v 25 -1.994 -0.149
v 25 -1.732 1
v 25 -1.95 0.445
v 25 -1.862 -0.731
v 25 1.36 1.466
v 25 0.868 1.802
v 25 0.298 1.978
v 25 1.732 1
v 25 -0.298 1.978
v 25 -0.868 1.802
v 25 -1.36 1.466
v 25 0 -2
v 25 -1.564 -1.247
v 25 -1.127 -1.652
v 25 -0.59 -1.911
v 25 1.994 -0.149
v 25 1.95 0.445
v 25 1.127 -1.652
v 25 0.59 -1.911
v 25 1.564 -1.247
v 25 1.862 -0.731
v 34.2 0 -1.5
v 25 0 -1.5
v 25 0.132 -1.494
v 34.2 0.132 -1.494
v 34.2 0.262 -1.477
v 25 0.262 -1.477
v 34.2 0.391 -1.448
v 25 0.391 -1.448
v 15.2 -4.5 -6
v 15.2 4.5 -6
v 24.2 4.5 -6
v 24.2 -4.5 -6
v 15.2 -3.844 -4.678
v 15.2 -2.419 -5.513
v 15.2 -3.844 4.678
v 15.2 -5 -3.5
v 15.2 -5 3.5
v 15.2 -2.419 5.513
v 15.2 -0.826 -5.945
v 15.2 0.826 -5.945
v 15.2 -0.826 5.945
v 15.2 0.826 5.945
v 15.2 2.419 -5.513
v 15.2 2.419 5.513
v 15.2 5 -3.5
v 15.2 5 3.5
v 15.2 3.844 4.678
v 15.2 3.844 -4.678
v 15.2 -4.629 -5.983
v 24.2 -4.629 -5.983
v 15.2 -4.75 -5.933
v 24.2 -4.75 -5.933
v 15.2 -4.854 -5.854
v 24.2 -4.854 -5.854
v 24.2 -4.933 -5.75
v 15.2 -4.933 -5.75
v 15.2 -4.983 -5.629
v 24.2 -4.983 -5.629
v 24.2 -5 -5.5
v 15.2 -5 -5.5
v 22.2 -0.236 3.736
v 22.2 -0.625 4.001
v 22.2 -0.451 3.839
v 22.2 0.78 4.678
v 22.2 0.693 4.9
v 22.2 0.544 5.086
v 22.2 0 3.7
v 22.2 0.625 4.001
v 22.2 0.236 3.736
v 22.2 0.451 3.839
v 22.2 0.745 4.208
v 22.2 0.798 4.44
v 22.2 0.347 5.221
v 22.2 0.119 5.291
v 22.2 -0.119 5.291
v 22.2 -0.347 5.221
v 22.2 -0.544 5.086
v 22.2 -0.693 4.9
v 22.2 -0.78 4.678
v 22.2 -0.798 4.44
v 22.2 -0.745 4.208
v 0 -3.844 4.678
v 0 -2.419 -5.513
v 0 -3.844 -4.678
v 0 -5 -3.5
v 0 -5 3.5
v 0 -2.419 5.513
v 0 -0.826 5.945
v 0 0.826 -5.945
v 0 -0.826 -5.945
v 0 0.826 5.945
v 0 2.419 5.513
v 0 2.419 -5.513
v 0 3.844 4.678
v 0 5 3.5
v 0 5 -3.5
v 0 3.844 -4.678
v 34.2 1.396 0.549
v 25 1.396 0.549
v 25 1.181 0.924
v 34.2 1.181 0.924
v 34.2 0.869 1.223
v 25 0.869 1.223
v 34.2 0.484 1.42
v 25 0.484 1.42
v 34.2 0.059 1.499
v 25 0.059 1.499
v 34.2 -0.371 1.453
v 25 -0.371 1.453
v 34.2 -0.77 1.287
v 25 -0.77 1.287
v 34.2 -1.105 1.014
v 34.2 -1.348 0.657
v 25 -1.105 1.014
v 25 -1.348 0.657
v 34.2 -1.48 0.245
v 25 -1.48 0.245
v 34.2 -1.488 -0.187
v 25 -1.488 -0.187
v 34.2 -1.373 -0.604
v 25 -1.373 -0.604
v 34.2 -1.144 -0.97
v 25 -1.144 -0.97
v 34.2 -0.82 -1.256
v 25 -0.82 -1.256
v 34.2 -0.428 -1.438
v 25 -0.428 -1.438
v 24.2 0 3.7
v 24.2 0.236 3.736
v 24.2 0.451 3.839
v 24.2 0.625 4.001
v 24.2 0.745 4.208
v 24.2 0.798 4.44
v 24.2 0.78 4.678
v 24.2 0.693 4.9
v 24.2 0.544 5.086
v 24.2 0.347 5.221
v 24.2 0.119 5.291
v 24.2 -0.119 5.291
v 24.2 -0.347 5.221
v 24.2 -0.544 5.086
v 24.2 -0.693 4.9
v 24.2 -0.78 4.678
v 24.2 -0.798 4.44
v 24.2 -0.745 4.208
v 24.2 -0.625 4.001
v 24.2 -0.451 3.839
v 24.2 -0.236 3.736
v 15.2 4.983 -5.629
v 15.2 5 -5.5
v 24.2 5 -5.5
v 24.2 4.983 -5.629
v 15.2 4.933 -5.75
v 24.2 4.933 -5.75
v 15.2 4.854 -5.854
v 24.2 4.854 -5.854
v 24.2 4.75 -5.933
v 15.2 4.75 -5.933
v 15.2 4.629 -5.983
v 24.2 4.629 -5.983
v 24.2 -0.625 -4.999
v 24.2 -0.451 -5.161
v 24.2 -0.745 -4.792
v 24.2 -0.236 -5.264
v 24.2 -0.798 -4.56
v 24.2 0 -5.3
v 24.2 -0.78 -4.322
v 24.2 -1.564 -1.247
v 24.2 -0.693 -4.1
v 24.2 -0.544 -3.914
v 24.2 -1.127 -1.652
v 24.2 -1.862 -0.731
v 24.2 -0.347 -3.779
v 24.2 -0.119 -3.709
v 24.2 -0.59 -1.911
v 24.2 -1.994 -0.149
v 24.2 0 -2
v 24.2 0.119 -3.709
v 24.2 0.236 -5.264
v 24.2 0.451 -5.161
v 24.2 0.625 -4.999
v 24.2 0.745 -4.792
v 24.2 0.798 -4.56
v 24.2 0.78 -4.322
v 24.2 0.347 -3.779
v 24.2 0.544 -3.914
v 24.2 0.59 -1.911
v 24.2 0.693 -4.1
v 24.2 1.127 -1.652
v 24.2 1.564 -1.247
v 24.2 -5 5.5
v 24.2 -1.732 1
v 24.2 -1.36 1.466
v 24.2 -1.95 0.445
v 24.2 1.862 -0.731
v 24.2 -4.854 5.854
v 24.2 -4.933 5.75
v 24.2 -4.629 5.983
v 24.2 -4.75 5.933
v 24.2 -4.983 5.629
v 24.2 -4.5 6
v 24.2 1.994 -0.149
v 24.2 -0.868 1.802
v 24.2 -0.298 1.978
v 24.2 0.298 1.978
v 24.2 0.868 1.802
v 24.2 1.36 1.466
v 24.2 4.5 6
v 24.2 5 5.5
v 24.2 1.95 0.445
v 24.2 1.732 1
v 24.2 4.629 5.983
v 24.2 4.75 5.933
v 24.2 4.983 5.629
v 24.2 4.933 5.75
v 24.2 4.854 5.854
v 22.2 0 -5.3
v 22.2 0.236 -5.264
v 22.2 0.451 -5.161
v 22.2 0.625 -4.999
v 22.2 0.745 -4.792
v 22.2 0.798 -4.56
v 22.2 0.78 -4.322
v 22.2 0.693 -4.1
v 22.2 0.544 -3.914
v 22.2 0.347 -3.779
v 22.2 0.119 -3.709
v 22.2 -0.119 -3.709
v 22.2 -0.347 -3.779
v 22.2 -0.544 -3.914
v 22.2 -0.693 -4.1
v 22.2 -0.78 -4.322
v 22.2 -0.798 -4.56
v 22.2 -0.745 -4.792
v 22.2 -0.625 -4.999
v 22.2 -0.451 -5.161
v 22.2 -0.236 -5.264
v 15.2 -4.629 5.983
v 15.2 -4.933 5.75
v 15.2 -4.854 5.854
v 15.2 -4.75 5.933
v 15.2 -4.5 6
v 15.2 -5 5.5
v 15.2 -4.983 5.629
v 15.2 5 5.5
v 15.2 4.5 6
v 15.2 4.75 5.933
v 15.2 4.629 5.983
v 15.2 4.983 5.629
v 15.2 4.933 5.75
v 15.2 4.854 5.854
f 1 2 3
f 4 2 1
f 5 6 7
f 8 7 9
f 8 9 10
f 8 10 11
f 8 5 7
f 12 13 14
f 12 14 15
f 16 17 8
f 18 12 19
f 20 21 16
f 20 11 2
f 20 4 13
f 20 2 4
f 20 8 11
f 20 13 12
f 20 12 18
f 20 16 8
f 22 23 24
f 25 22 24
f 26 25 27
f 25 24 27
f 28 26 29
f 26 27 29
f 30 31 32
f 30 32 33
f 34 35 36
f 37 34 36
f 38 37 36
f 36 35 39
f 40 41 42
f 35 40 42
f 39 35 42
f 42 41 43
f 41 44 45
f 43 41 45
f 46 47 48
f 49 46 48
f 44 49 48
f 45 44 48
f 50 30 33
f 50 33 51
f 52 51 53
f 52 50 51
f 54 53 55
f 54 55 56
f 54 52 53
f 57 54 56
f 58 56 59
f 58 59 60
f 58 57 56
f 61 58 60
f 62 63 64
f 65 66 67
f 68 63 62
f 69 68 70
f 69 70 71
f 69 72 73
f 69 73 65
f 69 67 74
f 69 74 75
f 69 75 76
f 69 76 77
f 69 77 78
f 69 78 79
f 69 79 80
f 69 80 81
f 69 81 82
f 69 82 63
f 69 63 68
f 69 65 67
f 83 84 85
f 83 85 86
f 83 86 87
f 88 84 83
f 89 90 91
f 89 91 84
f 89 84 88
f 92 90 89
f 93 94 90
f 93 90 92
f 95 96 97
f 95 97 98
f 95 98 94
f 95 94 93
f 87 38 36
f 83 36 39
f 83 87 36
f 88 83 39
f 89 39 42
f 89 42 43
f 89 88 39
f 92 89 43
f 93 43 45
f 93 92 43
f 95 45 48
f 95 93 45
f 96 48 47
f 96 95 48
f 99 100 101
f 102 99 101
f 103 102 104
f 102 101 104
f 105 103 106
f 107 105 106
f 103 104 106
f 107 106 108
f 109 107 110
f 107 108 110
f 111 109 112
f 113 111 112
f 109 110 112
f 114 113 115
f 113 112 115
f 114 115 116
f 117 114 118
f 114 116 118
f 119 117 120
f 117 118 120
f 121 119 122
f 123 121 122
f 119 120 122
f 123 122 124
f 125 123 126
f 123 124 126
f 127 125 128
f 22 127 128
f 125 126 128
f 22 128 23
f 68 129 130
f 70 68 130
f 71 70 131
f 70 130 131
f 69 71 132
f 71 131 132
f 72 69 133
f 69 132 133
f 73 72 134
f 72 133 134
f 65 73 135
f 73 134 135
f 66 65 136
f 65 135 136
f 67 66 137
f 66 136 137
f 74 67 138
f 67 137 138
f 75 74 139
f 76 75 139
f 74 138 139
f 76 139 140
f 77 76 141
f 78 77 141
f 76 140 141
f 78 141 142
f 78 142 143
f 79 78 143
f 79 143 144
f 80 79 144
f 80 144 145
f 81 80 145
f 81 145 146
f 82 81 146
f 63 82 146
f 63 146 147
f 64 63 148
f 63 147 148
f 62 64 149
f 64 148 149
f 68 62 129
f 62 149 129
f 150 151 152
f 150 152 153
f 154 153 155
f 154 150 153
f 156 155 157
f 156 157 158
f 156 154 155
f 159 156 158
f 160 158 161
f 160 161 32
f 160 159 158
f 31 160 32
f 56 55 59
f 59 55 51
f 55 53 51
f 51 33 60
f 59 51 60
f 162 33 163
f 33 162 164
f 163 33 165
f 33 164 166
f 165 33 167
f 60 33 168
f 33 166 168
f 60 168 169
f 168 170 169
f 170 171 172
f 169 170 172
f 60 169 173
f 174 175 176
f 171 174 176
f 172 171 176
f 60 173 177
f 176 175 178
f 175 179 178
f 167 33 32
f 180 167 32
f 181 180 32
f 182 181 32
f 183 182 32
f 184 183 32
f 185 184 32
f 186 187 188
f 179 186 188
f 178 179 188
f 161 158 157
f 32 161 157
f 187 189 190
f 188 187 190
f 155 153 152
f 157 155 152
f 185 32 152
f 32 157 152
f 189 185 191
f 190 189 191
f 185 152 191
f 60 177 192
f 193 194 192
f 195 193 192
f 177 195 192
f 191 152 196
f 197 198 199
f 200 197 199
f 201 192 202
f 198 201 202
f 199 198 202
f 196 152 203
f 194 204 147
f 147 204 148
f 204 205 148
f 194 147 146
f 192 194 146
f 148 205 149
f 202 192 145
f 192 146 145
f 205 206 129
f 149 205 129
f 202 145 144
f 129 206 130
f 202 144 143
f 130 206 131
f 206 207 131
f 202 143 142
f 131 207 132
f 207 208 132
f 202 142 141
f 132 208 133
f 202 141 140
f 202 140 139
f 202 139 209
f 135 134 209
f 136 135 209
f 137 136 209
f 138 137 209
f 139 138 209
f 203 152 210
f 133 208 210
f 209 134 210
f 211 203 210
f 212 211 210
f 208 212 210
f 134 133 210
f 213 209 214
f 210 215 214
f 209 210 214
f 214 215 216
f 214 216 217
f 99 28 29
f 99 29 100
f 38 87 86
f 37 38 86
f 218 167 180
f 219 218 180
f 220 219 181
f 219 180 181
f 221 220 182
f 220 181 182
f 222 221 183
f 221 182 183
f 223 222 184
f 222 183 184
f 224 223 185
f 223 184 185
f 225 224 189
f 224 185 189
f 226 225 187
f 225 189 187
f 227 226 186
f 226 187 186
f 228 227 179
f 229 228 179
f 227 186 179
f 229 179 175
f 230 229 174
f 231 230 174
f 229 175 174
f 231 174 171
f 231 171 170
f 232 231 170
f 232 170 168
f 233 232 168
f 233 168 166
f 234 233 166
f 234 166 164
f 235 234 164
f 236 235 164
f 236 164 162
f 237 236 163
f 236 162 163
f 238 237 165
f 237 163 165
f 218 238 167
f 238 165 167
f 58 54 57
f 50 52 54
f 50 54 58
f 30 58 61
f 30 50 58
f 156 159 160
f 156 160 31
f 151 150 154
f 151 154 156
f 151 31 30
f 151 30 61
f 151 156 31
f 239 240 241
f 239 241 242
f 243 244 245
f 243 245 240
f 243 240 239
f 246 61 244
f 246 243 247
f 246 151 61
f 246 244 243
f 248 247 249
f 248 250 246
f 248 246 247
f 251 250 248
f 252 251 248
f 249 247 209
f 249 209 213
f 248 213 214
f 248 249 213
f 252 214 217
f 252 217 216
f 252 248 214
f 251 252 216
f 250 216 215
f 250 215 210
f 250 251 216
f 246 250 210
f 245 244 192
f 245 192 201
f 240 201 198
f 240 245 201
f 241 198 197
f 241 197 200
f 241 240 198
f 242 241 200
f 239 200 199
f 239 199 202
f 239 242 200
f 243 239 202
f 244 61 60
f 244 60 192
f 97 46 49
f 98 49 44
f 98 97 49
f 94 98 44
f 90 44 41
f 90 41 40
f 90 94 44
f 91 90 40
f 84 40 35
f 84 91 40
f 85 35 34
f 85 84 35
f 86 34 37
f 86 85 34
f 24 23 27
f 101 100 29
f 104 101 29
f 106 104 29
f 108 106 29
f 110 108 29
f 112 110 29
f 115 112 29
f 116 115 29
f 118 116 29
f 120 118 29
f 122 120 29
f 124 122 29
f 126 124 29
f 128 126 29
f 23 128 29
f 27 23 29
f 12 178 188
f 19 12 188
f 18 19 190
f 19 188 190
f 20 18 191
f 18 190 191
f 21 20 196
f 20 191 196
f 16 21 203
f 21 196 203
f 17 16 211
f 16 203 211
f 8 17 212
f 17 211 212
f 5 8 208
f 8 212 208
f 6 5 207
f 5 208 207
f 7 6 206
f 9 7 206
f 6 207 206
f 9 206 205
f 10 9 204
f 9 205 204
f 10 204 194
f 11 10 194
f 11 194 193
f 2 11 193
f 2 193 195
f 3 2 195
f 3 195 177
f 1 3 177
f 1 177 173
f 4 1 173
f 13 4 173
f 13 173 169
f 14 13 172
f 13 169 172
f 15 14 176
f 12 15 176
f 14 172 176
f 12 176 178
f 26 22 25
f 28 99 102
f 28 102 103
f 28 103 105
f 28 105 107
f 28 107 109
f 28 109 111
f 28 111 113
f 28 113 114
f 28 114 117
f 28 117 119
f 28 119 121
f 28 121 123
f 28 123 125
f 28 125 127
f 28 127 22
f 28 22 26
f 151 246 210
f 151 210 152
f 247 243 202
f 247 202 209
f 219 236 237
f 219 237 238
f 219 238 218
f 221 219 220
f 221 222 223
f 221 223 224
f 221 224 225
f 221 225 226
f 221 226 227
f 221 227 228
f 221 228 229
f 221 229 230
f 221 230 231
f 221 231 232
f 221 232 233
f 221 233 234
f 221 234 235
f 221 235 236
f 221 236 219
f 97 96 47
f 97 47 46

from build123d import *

# Parameters (mm, degrees)
SKETCH1_W           = 7
SKETCH1_H           = 10
BOSS_EXTRUDE3_DEPTH = 15.2
BOSS_EXTRUDE4_DEPTH = 9
SKETCH4_R           = 2
BOSS_EXTRUDE5_DEPTH = 0.8
BOSS_EXTRUDE6_DEPTH = 9.2
SKETCH6_R           = 0.8
CUT_EXTRUDE1_DEPTH  = 2


with BuildPart() as part:
    # Sketch1 → Boss-Extrude3 (new body)
    with BuildSketch(Plane(origin=(0, 0, 0), x_dir=(0, 0, -1), z_dir=(1, 0, 0))):
        with BuildLine():
            Line((-3.5, 5), (-3.5, -5))
            ThreePointArc((-3.5, -5), (-6, 0), (-3.5, 5))
        make_face()
        Rectangle(SKETCH1_W, SKETCH1_H)
        with BuildLine():
            ThreePointArc((3.5, 5), (6, 0), (3.5, -5))
            Line((3.5, -5), (3.5, 5))
        make_face()
    extrude(amount=BOSS_EXTRUDE3_DEPTH)


with BuildPart() as body_2:
    # Sketch3 → Boss-Extrude4 (new body)
    with BuildSketch(Plane(origin=(15.2, 0, 0), x_dir=(0, 0, -1), z_dir=(1, 0, 0))):
        with BuildLine():
            Line((-5.5, 5), (5.5, 5))
            ThreePointArc((5.5, 5), (5.853553391, 4.853553391), (6, 4.5))
            Line((6, 4.5), (6, -4.5))
            ThreePointArc((6, -4.5), (5.853553391, -4.853553391), (5.5, -5))
            Line((5.5, -5), (-5.5, -5))
            ThreePointArc((-5.5, -5), (-5.853553391, -4.853553391), (-6, -4.5))
            Line((-6, -4.5), (-6, 4.5))
            ThreePointArc((-6, 4.5), (-5.853553391, 4.853553391), (-5.5, 5))
        make_face()
    extrude(amount=BOSS_EXTRUDE4_DEPTH)

    # Sketch4 → Boss-Extrude5 (add)
    with BuildSketch(Plane(origin=(24.2, 0, 0), x_dir=(0, 0, -1), z_dir=(1, 0, 0))):
        Circle(SKETCH4_R)
    extrude(amount=BOSS_EXTRUDE5_DEPTH)

    # Sketch6 → Cut-Extrude1 (cut)
    with BuildSketch(Plane(origin=(24.2, 0, 0), x_dir=(0, 0, -1), z_dir=(1, 0, 0))):
        with Locations((4.5, 0)):
            Circle(SKETCH6_R)
        with Locations((-4.5, 0)):
            Circle(SKETCH6_R)
    extrude(amount=-CUT_EXTRUDE1_DEPTH, mode=Mode.SUBTRACT)


with BuildPart() as body_3:
    # Sketch5 → Boss-Extrude6 (new body)
    with BuildSketch(Plane(origin=(25, 0, 0), x_dir=(0, 0, -1), z_dir=(1, 0, 0))):
        with BuildLine():
            Line((1.448199531, 0.390791656), (-0.54928293, 1.39581097))
            ThreePointArc((-0.54928293, 1.39581097), (-0.844415658, -1.239742795), (1.5, 0))
            ThreePointArc((1.5, 0), (1.486993493, 0.197104926), (1.448199531, 0.390791656))
        make_face()
    extrude(amount=BOSS_EXTRUDE6_DEPTH)


solid = Compound([part.part, body_2.part, body_3.part])
